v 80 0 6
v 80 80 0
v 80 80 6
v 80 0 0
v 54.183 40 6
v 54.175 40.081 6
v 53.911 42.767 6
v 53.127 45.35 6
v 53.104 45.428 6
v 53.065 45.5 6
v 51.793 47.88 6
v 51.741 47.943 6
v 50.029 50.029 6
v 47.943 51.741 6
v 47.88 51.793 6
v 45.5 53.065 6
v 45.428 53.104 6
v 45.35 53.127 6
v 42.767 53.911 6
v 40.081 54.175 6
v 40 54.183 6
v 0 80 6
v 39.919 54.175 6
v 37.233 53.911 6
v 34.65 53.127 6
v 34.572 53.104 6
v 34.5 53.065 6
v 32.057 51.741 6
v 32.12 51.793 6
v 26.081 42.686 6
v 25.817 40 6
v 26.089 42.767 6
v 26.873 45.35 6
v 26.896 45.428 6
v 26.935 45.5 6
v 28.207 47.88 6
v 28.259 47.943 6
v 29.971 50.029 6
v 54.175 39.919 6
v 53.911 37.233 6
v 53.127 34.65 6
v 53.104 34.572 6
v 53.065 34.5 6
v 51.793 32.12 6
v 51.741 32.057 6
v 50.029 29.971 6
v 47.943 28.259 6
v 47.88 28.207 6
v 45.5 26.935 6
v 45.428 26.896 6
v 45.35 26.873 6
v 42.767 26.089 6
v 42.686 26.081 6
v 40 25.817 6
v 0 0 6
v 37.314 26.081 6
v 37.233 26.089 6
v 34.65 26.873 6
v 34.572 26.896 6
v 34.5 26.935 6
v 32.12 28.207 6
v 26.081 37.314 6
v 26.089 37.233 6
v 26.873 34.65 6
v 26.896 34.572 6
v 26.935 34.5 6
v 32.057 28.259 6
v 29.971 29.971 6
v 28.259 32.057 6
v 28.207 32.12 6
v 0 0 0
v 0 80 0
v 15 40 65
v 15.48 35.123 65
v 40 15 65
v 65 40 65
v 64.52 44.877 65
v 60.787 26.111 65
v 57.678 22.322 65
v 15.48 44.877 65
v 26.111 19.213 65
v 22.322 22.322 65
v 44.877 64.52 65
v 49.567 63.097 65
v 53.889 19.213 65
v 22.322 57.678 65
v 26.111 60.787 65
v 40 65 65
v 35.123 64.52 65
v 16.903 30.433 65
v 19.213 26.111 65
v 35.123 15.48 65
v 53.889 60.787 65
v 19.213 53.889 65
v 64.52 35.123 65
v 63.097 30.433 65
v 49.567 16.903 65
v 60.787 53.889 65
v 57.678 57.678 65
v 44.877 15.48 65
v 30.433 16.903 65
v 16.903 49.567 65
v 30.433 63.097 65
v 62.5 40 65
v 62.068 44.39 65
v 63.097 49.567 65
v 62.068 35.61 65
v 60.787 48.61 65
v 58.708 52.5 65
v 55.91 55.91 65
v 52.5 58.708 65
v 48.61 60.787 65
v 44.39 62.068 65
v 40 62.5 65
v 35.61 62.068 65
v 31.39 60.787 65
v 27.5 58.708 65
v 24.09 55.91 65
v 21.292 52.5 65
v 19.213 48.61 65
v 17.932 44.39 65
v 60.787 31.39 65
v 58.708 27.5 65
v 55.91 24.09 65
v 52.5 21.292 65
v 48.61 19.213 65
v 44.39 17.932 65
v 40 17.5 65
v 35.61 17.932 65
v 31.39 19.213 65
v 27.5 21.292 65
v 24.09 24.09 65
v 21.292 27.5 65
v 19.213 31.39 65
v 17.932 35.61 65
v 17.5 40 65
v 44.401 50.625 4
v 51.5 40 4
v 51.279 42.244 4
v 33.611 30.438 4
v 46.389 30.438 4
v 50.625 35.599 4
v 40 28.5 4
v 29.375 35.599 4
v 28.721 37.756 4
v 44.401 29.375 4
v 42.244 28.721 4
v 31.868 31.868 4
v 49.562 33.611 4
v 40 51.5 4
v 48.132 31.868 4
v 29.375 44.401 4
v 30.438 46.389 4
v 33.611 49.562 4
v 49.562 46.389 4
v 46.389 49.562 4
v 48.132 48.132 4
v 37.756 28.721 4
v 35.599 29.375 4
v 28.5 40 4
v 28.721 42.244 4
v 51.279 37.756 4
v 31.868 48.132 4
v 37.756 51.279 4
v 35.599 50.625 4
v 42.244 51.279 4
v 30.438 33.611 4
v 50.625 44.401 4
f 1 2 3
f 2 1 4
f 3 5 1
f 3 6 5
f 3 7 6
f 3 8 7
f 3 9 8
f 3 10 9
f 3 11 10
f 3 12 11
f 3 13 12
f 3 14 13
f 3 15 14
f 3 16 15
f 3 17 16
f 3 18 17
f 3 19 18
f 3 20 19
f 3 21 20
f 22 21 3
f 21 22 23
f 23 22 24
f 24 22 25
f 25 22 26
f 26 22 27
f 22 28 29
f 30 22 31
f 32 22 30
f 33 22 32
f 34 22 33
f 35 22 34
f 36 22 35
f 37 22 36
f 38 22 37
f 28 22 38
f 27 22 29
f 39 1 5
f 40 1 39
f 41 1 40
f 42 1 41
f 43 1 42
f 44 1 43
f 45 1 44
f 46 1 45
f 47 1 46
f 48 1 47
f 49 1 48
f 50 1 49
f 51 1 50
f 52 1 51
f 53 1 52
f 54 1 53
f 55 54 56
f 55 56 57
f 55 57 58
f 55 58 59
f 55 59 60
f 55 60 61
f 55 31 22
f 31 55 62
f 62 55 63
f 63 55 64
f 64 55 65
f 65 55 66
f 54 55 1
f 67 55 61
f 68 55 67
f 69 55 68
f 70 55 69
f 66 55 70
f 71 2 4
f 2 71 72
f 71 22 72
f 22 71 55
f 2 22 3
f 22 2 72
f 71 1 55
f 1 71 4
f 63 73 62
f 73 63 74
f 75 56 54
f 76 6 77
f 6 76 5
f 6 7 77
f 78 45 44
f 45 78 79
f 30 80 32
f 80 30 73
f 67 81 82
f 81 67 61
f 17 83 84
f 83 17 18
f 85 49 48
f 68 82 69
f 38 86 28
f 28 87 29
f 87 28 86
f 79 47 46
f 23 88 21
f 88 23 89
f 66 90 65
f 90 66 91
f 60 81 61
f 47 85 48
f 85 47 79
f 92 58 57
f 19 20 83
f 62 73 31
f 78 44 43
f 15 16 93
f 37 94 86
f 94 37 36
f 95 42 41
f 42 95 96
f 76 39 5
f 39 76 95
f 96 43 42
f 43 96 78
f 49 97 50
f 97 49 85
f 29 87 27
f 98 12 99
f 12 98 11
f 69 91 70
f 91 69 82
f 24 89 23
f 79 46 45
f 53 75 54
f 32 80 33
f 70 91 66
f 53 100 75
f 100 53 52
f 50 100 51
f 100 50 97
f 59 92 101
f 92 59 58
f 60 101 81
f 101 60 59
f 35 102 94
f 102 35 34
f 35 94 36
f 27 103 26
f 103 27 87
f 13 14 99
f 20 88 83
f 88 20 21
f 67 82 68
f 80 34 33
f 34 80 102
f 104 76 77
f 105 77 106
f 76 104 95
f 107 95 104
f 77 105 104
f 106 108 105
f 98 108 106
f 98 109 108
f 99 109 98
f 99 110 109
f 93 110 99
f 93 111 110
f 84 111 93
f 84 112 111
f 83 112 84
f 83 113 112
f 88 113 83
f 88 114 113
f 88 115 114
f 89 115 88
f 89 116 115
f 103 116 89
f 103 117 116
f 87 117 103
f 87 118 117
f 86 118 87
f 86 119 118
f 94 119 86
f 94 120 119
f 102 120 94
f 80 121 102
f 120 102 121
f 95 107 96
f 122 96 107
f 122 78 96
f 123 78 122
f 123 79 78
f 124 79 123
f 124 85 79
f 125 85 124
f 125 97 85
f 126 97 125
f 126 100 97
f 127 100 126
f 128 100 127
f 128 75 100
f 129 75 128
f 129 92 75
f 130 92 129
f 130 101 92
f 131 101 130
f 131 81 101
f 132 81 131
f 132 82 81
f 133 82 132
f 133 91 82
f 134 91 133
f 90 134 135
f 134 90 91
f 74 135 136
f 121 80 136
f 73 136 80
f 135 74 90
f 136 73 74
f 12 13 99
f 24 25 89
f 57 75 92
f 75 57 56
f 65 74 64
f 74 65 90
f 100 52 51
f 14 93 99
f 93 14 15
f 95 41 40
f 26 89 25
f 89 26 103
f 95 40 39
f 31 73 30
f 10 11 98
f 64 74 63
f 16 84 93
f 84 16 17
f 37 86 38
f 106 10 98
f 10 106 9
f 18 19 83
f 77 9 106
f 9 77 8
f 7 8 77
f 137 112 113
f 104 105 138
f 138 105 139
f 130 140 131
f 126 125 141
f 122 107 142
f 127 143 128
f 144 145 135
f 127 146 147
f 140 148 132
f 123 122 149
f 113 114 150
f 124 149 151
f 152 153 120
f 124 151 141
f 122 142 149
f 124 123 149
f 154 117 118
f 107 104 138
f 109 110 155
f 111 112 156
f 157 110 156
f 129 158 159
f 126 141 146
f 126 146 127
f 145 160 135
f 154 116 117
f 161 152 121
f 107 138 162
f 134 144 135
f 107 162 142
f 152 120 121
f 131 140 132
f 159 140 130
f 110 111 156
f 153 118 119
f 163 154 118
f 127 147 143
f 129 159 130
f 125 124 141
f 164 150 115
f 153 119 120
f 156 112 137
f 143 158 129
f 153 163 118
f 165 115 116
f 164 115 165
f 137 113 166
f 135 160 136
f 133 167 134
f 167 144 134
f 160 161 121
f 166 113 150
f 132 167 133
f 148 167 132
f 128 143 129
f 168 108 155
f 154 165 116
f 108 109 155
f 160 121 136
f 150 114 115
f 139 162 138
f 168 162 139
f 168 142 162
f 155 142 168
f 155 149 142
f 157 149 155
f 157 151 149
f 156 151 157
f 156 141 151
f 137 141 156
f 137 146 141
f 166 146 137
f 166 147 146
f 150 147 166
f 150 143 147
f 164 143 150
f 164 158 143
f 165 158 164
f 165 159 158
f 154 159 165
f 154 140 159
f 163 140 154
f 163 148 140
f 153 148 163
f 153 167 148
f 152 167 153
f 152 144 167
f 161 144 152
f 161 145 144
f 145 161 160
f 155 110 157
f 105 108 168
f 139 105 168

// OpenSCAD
$fn = 32;

// ----------------------------------------------------------------------
// Hopper: funnel with square flange
// ----------------------------------------------------------------------

// --- parameters (mm) ---
fl = 80;                  // flange side, X and Y
fl_t = 6;                 // flange thickness
cone_h = 60;              // cone height above the flange
top_d = 50;               // cone mouth diameter
bot_d = 28;               // cone spout diameter
wall = 2.5;               // cone wall thickness
fit_tol = 0.1;            // tolerance for press fits, mm
free_tol = 0.3;           // tolerance for clearance fits, mm

bore_d = bot_d - 2 * wall;  // spout bore diameter
total_h = fl_t + cone_h - 1;  // overall height

difference() {
  union() {
    cube([fl, fl, fl_t]);
    translate([fl / 2, fl / 2, fl_t - 1])
      cylinder(h = cone_h, d1 = bot_d, d2 = top_d);
  }
  translate([fl / 2, fl / 2, fl_t - 2])
    cylinder(h = cone_h + 1, d1 = bore_d, d2 = top_d - 2 * wall);
}
